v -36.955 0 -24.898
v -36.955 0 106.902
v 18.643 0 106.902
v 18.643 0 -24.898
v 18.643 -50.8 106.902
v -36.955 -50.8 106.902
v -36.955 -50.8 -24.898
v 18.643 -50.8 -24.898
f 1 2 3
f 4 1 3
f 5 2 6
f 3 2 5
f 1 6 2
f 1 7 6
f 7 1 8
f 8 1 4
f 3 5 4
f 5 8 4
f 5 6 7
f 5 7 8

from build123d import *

# Parameters (mm, degrees)
F0_W      = 55.598326
F0_H      = 36.226526
F1_DEPTH  = 25.4
F1_FACE_W = 55.598326
F1_FACE_H = 36.226526
F2_DEPTH  = 25.4
F2_FACE_W = 55.598326
F2_FACE_H = 50.8
F3_DEPTH  = 95.573299


with BuildPart() as f1:
    # F0 (on Front) → F1 (new body)
    with BuildSketch(Plane.XZ):
        with Locations((-9.156186, -6.78467)):
            Rectangle(F0_W, F0_H)
    extrude(amount=F1_DEPTH)

    # F1_face (on face) → F2 (join)
    with BuildSketch(Plane(origin=(-9.156186, -25.4, -6.78467), x_dir=(1, 0, 0), z_dir=(0, -1, 0))):
        Rectangle(F1_FACE_W, F1_FACE_H)
    extrude(amount=F2_DEPTH)

    # F2_face (on face) → F3 (join)
    with BuildSketch(Plane(origin=(-9.156186, -25.4, 11.328593), x_dir=(1, 0, 0), z_dir=(0, 0, 1))):
        Rectangle(F2_FACE_W, F2_FACE_H)
    extrude(amount=F3_DEPTH)


solid = f1.part
